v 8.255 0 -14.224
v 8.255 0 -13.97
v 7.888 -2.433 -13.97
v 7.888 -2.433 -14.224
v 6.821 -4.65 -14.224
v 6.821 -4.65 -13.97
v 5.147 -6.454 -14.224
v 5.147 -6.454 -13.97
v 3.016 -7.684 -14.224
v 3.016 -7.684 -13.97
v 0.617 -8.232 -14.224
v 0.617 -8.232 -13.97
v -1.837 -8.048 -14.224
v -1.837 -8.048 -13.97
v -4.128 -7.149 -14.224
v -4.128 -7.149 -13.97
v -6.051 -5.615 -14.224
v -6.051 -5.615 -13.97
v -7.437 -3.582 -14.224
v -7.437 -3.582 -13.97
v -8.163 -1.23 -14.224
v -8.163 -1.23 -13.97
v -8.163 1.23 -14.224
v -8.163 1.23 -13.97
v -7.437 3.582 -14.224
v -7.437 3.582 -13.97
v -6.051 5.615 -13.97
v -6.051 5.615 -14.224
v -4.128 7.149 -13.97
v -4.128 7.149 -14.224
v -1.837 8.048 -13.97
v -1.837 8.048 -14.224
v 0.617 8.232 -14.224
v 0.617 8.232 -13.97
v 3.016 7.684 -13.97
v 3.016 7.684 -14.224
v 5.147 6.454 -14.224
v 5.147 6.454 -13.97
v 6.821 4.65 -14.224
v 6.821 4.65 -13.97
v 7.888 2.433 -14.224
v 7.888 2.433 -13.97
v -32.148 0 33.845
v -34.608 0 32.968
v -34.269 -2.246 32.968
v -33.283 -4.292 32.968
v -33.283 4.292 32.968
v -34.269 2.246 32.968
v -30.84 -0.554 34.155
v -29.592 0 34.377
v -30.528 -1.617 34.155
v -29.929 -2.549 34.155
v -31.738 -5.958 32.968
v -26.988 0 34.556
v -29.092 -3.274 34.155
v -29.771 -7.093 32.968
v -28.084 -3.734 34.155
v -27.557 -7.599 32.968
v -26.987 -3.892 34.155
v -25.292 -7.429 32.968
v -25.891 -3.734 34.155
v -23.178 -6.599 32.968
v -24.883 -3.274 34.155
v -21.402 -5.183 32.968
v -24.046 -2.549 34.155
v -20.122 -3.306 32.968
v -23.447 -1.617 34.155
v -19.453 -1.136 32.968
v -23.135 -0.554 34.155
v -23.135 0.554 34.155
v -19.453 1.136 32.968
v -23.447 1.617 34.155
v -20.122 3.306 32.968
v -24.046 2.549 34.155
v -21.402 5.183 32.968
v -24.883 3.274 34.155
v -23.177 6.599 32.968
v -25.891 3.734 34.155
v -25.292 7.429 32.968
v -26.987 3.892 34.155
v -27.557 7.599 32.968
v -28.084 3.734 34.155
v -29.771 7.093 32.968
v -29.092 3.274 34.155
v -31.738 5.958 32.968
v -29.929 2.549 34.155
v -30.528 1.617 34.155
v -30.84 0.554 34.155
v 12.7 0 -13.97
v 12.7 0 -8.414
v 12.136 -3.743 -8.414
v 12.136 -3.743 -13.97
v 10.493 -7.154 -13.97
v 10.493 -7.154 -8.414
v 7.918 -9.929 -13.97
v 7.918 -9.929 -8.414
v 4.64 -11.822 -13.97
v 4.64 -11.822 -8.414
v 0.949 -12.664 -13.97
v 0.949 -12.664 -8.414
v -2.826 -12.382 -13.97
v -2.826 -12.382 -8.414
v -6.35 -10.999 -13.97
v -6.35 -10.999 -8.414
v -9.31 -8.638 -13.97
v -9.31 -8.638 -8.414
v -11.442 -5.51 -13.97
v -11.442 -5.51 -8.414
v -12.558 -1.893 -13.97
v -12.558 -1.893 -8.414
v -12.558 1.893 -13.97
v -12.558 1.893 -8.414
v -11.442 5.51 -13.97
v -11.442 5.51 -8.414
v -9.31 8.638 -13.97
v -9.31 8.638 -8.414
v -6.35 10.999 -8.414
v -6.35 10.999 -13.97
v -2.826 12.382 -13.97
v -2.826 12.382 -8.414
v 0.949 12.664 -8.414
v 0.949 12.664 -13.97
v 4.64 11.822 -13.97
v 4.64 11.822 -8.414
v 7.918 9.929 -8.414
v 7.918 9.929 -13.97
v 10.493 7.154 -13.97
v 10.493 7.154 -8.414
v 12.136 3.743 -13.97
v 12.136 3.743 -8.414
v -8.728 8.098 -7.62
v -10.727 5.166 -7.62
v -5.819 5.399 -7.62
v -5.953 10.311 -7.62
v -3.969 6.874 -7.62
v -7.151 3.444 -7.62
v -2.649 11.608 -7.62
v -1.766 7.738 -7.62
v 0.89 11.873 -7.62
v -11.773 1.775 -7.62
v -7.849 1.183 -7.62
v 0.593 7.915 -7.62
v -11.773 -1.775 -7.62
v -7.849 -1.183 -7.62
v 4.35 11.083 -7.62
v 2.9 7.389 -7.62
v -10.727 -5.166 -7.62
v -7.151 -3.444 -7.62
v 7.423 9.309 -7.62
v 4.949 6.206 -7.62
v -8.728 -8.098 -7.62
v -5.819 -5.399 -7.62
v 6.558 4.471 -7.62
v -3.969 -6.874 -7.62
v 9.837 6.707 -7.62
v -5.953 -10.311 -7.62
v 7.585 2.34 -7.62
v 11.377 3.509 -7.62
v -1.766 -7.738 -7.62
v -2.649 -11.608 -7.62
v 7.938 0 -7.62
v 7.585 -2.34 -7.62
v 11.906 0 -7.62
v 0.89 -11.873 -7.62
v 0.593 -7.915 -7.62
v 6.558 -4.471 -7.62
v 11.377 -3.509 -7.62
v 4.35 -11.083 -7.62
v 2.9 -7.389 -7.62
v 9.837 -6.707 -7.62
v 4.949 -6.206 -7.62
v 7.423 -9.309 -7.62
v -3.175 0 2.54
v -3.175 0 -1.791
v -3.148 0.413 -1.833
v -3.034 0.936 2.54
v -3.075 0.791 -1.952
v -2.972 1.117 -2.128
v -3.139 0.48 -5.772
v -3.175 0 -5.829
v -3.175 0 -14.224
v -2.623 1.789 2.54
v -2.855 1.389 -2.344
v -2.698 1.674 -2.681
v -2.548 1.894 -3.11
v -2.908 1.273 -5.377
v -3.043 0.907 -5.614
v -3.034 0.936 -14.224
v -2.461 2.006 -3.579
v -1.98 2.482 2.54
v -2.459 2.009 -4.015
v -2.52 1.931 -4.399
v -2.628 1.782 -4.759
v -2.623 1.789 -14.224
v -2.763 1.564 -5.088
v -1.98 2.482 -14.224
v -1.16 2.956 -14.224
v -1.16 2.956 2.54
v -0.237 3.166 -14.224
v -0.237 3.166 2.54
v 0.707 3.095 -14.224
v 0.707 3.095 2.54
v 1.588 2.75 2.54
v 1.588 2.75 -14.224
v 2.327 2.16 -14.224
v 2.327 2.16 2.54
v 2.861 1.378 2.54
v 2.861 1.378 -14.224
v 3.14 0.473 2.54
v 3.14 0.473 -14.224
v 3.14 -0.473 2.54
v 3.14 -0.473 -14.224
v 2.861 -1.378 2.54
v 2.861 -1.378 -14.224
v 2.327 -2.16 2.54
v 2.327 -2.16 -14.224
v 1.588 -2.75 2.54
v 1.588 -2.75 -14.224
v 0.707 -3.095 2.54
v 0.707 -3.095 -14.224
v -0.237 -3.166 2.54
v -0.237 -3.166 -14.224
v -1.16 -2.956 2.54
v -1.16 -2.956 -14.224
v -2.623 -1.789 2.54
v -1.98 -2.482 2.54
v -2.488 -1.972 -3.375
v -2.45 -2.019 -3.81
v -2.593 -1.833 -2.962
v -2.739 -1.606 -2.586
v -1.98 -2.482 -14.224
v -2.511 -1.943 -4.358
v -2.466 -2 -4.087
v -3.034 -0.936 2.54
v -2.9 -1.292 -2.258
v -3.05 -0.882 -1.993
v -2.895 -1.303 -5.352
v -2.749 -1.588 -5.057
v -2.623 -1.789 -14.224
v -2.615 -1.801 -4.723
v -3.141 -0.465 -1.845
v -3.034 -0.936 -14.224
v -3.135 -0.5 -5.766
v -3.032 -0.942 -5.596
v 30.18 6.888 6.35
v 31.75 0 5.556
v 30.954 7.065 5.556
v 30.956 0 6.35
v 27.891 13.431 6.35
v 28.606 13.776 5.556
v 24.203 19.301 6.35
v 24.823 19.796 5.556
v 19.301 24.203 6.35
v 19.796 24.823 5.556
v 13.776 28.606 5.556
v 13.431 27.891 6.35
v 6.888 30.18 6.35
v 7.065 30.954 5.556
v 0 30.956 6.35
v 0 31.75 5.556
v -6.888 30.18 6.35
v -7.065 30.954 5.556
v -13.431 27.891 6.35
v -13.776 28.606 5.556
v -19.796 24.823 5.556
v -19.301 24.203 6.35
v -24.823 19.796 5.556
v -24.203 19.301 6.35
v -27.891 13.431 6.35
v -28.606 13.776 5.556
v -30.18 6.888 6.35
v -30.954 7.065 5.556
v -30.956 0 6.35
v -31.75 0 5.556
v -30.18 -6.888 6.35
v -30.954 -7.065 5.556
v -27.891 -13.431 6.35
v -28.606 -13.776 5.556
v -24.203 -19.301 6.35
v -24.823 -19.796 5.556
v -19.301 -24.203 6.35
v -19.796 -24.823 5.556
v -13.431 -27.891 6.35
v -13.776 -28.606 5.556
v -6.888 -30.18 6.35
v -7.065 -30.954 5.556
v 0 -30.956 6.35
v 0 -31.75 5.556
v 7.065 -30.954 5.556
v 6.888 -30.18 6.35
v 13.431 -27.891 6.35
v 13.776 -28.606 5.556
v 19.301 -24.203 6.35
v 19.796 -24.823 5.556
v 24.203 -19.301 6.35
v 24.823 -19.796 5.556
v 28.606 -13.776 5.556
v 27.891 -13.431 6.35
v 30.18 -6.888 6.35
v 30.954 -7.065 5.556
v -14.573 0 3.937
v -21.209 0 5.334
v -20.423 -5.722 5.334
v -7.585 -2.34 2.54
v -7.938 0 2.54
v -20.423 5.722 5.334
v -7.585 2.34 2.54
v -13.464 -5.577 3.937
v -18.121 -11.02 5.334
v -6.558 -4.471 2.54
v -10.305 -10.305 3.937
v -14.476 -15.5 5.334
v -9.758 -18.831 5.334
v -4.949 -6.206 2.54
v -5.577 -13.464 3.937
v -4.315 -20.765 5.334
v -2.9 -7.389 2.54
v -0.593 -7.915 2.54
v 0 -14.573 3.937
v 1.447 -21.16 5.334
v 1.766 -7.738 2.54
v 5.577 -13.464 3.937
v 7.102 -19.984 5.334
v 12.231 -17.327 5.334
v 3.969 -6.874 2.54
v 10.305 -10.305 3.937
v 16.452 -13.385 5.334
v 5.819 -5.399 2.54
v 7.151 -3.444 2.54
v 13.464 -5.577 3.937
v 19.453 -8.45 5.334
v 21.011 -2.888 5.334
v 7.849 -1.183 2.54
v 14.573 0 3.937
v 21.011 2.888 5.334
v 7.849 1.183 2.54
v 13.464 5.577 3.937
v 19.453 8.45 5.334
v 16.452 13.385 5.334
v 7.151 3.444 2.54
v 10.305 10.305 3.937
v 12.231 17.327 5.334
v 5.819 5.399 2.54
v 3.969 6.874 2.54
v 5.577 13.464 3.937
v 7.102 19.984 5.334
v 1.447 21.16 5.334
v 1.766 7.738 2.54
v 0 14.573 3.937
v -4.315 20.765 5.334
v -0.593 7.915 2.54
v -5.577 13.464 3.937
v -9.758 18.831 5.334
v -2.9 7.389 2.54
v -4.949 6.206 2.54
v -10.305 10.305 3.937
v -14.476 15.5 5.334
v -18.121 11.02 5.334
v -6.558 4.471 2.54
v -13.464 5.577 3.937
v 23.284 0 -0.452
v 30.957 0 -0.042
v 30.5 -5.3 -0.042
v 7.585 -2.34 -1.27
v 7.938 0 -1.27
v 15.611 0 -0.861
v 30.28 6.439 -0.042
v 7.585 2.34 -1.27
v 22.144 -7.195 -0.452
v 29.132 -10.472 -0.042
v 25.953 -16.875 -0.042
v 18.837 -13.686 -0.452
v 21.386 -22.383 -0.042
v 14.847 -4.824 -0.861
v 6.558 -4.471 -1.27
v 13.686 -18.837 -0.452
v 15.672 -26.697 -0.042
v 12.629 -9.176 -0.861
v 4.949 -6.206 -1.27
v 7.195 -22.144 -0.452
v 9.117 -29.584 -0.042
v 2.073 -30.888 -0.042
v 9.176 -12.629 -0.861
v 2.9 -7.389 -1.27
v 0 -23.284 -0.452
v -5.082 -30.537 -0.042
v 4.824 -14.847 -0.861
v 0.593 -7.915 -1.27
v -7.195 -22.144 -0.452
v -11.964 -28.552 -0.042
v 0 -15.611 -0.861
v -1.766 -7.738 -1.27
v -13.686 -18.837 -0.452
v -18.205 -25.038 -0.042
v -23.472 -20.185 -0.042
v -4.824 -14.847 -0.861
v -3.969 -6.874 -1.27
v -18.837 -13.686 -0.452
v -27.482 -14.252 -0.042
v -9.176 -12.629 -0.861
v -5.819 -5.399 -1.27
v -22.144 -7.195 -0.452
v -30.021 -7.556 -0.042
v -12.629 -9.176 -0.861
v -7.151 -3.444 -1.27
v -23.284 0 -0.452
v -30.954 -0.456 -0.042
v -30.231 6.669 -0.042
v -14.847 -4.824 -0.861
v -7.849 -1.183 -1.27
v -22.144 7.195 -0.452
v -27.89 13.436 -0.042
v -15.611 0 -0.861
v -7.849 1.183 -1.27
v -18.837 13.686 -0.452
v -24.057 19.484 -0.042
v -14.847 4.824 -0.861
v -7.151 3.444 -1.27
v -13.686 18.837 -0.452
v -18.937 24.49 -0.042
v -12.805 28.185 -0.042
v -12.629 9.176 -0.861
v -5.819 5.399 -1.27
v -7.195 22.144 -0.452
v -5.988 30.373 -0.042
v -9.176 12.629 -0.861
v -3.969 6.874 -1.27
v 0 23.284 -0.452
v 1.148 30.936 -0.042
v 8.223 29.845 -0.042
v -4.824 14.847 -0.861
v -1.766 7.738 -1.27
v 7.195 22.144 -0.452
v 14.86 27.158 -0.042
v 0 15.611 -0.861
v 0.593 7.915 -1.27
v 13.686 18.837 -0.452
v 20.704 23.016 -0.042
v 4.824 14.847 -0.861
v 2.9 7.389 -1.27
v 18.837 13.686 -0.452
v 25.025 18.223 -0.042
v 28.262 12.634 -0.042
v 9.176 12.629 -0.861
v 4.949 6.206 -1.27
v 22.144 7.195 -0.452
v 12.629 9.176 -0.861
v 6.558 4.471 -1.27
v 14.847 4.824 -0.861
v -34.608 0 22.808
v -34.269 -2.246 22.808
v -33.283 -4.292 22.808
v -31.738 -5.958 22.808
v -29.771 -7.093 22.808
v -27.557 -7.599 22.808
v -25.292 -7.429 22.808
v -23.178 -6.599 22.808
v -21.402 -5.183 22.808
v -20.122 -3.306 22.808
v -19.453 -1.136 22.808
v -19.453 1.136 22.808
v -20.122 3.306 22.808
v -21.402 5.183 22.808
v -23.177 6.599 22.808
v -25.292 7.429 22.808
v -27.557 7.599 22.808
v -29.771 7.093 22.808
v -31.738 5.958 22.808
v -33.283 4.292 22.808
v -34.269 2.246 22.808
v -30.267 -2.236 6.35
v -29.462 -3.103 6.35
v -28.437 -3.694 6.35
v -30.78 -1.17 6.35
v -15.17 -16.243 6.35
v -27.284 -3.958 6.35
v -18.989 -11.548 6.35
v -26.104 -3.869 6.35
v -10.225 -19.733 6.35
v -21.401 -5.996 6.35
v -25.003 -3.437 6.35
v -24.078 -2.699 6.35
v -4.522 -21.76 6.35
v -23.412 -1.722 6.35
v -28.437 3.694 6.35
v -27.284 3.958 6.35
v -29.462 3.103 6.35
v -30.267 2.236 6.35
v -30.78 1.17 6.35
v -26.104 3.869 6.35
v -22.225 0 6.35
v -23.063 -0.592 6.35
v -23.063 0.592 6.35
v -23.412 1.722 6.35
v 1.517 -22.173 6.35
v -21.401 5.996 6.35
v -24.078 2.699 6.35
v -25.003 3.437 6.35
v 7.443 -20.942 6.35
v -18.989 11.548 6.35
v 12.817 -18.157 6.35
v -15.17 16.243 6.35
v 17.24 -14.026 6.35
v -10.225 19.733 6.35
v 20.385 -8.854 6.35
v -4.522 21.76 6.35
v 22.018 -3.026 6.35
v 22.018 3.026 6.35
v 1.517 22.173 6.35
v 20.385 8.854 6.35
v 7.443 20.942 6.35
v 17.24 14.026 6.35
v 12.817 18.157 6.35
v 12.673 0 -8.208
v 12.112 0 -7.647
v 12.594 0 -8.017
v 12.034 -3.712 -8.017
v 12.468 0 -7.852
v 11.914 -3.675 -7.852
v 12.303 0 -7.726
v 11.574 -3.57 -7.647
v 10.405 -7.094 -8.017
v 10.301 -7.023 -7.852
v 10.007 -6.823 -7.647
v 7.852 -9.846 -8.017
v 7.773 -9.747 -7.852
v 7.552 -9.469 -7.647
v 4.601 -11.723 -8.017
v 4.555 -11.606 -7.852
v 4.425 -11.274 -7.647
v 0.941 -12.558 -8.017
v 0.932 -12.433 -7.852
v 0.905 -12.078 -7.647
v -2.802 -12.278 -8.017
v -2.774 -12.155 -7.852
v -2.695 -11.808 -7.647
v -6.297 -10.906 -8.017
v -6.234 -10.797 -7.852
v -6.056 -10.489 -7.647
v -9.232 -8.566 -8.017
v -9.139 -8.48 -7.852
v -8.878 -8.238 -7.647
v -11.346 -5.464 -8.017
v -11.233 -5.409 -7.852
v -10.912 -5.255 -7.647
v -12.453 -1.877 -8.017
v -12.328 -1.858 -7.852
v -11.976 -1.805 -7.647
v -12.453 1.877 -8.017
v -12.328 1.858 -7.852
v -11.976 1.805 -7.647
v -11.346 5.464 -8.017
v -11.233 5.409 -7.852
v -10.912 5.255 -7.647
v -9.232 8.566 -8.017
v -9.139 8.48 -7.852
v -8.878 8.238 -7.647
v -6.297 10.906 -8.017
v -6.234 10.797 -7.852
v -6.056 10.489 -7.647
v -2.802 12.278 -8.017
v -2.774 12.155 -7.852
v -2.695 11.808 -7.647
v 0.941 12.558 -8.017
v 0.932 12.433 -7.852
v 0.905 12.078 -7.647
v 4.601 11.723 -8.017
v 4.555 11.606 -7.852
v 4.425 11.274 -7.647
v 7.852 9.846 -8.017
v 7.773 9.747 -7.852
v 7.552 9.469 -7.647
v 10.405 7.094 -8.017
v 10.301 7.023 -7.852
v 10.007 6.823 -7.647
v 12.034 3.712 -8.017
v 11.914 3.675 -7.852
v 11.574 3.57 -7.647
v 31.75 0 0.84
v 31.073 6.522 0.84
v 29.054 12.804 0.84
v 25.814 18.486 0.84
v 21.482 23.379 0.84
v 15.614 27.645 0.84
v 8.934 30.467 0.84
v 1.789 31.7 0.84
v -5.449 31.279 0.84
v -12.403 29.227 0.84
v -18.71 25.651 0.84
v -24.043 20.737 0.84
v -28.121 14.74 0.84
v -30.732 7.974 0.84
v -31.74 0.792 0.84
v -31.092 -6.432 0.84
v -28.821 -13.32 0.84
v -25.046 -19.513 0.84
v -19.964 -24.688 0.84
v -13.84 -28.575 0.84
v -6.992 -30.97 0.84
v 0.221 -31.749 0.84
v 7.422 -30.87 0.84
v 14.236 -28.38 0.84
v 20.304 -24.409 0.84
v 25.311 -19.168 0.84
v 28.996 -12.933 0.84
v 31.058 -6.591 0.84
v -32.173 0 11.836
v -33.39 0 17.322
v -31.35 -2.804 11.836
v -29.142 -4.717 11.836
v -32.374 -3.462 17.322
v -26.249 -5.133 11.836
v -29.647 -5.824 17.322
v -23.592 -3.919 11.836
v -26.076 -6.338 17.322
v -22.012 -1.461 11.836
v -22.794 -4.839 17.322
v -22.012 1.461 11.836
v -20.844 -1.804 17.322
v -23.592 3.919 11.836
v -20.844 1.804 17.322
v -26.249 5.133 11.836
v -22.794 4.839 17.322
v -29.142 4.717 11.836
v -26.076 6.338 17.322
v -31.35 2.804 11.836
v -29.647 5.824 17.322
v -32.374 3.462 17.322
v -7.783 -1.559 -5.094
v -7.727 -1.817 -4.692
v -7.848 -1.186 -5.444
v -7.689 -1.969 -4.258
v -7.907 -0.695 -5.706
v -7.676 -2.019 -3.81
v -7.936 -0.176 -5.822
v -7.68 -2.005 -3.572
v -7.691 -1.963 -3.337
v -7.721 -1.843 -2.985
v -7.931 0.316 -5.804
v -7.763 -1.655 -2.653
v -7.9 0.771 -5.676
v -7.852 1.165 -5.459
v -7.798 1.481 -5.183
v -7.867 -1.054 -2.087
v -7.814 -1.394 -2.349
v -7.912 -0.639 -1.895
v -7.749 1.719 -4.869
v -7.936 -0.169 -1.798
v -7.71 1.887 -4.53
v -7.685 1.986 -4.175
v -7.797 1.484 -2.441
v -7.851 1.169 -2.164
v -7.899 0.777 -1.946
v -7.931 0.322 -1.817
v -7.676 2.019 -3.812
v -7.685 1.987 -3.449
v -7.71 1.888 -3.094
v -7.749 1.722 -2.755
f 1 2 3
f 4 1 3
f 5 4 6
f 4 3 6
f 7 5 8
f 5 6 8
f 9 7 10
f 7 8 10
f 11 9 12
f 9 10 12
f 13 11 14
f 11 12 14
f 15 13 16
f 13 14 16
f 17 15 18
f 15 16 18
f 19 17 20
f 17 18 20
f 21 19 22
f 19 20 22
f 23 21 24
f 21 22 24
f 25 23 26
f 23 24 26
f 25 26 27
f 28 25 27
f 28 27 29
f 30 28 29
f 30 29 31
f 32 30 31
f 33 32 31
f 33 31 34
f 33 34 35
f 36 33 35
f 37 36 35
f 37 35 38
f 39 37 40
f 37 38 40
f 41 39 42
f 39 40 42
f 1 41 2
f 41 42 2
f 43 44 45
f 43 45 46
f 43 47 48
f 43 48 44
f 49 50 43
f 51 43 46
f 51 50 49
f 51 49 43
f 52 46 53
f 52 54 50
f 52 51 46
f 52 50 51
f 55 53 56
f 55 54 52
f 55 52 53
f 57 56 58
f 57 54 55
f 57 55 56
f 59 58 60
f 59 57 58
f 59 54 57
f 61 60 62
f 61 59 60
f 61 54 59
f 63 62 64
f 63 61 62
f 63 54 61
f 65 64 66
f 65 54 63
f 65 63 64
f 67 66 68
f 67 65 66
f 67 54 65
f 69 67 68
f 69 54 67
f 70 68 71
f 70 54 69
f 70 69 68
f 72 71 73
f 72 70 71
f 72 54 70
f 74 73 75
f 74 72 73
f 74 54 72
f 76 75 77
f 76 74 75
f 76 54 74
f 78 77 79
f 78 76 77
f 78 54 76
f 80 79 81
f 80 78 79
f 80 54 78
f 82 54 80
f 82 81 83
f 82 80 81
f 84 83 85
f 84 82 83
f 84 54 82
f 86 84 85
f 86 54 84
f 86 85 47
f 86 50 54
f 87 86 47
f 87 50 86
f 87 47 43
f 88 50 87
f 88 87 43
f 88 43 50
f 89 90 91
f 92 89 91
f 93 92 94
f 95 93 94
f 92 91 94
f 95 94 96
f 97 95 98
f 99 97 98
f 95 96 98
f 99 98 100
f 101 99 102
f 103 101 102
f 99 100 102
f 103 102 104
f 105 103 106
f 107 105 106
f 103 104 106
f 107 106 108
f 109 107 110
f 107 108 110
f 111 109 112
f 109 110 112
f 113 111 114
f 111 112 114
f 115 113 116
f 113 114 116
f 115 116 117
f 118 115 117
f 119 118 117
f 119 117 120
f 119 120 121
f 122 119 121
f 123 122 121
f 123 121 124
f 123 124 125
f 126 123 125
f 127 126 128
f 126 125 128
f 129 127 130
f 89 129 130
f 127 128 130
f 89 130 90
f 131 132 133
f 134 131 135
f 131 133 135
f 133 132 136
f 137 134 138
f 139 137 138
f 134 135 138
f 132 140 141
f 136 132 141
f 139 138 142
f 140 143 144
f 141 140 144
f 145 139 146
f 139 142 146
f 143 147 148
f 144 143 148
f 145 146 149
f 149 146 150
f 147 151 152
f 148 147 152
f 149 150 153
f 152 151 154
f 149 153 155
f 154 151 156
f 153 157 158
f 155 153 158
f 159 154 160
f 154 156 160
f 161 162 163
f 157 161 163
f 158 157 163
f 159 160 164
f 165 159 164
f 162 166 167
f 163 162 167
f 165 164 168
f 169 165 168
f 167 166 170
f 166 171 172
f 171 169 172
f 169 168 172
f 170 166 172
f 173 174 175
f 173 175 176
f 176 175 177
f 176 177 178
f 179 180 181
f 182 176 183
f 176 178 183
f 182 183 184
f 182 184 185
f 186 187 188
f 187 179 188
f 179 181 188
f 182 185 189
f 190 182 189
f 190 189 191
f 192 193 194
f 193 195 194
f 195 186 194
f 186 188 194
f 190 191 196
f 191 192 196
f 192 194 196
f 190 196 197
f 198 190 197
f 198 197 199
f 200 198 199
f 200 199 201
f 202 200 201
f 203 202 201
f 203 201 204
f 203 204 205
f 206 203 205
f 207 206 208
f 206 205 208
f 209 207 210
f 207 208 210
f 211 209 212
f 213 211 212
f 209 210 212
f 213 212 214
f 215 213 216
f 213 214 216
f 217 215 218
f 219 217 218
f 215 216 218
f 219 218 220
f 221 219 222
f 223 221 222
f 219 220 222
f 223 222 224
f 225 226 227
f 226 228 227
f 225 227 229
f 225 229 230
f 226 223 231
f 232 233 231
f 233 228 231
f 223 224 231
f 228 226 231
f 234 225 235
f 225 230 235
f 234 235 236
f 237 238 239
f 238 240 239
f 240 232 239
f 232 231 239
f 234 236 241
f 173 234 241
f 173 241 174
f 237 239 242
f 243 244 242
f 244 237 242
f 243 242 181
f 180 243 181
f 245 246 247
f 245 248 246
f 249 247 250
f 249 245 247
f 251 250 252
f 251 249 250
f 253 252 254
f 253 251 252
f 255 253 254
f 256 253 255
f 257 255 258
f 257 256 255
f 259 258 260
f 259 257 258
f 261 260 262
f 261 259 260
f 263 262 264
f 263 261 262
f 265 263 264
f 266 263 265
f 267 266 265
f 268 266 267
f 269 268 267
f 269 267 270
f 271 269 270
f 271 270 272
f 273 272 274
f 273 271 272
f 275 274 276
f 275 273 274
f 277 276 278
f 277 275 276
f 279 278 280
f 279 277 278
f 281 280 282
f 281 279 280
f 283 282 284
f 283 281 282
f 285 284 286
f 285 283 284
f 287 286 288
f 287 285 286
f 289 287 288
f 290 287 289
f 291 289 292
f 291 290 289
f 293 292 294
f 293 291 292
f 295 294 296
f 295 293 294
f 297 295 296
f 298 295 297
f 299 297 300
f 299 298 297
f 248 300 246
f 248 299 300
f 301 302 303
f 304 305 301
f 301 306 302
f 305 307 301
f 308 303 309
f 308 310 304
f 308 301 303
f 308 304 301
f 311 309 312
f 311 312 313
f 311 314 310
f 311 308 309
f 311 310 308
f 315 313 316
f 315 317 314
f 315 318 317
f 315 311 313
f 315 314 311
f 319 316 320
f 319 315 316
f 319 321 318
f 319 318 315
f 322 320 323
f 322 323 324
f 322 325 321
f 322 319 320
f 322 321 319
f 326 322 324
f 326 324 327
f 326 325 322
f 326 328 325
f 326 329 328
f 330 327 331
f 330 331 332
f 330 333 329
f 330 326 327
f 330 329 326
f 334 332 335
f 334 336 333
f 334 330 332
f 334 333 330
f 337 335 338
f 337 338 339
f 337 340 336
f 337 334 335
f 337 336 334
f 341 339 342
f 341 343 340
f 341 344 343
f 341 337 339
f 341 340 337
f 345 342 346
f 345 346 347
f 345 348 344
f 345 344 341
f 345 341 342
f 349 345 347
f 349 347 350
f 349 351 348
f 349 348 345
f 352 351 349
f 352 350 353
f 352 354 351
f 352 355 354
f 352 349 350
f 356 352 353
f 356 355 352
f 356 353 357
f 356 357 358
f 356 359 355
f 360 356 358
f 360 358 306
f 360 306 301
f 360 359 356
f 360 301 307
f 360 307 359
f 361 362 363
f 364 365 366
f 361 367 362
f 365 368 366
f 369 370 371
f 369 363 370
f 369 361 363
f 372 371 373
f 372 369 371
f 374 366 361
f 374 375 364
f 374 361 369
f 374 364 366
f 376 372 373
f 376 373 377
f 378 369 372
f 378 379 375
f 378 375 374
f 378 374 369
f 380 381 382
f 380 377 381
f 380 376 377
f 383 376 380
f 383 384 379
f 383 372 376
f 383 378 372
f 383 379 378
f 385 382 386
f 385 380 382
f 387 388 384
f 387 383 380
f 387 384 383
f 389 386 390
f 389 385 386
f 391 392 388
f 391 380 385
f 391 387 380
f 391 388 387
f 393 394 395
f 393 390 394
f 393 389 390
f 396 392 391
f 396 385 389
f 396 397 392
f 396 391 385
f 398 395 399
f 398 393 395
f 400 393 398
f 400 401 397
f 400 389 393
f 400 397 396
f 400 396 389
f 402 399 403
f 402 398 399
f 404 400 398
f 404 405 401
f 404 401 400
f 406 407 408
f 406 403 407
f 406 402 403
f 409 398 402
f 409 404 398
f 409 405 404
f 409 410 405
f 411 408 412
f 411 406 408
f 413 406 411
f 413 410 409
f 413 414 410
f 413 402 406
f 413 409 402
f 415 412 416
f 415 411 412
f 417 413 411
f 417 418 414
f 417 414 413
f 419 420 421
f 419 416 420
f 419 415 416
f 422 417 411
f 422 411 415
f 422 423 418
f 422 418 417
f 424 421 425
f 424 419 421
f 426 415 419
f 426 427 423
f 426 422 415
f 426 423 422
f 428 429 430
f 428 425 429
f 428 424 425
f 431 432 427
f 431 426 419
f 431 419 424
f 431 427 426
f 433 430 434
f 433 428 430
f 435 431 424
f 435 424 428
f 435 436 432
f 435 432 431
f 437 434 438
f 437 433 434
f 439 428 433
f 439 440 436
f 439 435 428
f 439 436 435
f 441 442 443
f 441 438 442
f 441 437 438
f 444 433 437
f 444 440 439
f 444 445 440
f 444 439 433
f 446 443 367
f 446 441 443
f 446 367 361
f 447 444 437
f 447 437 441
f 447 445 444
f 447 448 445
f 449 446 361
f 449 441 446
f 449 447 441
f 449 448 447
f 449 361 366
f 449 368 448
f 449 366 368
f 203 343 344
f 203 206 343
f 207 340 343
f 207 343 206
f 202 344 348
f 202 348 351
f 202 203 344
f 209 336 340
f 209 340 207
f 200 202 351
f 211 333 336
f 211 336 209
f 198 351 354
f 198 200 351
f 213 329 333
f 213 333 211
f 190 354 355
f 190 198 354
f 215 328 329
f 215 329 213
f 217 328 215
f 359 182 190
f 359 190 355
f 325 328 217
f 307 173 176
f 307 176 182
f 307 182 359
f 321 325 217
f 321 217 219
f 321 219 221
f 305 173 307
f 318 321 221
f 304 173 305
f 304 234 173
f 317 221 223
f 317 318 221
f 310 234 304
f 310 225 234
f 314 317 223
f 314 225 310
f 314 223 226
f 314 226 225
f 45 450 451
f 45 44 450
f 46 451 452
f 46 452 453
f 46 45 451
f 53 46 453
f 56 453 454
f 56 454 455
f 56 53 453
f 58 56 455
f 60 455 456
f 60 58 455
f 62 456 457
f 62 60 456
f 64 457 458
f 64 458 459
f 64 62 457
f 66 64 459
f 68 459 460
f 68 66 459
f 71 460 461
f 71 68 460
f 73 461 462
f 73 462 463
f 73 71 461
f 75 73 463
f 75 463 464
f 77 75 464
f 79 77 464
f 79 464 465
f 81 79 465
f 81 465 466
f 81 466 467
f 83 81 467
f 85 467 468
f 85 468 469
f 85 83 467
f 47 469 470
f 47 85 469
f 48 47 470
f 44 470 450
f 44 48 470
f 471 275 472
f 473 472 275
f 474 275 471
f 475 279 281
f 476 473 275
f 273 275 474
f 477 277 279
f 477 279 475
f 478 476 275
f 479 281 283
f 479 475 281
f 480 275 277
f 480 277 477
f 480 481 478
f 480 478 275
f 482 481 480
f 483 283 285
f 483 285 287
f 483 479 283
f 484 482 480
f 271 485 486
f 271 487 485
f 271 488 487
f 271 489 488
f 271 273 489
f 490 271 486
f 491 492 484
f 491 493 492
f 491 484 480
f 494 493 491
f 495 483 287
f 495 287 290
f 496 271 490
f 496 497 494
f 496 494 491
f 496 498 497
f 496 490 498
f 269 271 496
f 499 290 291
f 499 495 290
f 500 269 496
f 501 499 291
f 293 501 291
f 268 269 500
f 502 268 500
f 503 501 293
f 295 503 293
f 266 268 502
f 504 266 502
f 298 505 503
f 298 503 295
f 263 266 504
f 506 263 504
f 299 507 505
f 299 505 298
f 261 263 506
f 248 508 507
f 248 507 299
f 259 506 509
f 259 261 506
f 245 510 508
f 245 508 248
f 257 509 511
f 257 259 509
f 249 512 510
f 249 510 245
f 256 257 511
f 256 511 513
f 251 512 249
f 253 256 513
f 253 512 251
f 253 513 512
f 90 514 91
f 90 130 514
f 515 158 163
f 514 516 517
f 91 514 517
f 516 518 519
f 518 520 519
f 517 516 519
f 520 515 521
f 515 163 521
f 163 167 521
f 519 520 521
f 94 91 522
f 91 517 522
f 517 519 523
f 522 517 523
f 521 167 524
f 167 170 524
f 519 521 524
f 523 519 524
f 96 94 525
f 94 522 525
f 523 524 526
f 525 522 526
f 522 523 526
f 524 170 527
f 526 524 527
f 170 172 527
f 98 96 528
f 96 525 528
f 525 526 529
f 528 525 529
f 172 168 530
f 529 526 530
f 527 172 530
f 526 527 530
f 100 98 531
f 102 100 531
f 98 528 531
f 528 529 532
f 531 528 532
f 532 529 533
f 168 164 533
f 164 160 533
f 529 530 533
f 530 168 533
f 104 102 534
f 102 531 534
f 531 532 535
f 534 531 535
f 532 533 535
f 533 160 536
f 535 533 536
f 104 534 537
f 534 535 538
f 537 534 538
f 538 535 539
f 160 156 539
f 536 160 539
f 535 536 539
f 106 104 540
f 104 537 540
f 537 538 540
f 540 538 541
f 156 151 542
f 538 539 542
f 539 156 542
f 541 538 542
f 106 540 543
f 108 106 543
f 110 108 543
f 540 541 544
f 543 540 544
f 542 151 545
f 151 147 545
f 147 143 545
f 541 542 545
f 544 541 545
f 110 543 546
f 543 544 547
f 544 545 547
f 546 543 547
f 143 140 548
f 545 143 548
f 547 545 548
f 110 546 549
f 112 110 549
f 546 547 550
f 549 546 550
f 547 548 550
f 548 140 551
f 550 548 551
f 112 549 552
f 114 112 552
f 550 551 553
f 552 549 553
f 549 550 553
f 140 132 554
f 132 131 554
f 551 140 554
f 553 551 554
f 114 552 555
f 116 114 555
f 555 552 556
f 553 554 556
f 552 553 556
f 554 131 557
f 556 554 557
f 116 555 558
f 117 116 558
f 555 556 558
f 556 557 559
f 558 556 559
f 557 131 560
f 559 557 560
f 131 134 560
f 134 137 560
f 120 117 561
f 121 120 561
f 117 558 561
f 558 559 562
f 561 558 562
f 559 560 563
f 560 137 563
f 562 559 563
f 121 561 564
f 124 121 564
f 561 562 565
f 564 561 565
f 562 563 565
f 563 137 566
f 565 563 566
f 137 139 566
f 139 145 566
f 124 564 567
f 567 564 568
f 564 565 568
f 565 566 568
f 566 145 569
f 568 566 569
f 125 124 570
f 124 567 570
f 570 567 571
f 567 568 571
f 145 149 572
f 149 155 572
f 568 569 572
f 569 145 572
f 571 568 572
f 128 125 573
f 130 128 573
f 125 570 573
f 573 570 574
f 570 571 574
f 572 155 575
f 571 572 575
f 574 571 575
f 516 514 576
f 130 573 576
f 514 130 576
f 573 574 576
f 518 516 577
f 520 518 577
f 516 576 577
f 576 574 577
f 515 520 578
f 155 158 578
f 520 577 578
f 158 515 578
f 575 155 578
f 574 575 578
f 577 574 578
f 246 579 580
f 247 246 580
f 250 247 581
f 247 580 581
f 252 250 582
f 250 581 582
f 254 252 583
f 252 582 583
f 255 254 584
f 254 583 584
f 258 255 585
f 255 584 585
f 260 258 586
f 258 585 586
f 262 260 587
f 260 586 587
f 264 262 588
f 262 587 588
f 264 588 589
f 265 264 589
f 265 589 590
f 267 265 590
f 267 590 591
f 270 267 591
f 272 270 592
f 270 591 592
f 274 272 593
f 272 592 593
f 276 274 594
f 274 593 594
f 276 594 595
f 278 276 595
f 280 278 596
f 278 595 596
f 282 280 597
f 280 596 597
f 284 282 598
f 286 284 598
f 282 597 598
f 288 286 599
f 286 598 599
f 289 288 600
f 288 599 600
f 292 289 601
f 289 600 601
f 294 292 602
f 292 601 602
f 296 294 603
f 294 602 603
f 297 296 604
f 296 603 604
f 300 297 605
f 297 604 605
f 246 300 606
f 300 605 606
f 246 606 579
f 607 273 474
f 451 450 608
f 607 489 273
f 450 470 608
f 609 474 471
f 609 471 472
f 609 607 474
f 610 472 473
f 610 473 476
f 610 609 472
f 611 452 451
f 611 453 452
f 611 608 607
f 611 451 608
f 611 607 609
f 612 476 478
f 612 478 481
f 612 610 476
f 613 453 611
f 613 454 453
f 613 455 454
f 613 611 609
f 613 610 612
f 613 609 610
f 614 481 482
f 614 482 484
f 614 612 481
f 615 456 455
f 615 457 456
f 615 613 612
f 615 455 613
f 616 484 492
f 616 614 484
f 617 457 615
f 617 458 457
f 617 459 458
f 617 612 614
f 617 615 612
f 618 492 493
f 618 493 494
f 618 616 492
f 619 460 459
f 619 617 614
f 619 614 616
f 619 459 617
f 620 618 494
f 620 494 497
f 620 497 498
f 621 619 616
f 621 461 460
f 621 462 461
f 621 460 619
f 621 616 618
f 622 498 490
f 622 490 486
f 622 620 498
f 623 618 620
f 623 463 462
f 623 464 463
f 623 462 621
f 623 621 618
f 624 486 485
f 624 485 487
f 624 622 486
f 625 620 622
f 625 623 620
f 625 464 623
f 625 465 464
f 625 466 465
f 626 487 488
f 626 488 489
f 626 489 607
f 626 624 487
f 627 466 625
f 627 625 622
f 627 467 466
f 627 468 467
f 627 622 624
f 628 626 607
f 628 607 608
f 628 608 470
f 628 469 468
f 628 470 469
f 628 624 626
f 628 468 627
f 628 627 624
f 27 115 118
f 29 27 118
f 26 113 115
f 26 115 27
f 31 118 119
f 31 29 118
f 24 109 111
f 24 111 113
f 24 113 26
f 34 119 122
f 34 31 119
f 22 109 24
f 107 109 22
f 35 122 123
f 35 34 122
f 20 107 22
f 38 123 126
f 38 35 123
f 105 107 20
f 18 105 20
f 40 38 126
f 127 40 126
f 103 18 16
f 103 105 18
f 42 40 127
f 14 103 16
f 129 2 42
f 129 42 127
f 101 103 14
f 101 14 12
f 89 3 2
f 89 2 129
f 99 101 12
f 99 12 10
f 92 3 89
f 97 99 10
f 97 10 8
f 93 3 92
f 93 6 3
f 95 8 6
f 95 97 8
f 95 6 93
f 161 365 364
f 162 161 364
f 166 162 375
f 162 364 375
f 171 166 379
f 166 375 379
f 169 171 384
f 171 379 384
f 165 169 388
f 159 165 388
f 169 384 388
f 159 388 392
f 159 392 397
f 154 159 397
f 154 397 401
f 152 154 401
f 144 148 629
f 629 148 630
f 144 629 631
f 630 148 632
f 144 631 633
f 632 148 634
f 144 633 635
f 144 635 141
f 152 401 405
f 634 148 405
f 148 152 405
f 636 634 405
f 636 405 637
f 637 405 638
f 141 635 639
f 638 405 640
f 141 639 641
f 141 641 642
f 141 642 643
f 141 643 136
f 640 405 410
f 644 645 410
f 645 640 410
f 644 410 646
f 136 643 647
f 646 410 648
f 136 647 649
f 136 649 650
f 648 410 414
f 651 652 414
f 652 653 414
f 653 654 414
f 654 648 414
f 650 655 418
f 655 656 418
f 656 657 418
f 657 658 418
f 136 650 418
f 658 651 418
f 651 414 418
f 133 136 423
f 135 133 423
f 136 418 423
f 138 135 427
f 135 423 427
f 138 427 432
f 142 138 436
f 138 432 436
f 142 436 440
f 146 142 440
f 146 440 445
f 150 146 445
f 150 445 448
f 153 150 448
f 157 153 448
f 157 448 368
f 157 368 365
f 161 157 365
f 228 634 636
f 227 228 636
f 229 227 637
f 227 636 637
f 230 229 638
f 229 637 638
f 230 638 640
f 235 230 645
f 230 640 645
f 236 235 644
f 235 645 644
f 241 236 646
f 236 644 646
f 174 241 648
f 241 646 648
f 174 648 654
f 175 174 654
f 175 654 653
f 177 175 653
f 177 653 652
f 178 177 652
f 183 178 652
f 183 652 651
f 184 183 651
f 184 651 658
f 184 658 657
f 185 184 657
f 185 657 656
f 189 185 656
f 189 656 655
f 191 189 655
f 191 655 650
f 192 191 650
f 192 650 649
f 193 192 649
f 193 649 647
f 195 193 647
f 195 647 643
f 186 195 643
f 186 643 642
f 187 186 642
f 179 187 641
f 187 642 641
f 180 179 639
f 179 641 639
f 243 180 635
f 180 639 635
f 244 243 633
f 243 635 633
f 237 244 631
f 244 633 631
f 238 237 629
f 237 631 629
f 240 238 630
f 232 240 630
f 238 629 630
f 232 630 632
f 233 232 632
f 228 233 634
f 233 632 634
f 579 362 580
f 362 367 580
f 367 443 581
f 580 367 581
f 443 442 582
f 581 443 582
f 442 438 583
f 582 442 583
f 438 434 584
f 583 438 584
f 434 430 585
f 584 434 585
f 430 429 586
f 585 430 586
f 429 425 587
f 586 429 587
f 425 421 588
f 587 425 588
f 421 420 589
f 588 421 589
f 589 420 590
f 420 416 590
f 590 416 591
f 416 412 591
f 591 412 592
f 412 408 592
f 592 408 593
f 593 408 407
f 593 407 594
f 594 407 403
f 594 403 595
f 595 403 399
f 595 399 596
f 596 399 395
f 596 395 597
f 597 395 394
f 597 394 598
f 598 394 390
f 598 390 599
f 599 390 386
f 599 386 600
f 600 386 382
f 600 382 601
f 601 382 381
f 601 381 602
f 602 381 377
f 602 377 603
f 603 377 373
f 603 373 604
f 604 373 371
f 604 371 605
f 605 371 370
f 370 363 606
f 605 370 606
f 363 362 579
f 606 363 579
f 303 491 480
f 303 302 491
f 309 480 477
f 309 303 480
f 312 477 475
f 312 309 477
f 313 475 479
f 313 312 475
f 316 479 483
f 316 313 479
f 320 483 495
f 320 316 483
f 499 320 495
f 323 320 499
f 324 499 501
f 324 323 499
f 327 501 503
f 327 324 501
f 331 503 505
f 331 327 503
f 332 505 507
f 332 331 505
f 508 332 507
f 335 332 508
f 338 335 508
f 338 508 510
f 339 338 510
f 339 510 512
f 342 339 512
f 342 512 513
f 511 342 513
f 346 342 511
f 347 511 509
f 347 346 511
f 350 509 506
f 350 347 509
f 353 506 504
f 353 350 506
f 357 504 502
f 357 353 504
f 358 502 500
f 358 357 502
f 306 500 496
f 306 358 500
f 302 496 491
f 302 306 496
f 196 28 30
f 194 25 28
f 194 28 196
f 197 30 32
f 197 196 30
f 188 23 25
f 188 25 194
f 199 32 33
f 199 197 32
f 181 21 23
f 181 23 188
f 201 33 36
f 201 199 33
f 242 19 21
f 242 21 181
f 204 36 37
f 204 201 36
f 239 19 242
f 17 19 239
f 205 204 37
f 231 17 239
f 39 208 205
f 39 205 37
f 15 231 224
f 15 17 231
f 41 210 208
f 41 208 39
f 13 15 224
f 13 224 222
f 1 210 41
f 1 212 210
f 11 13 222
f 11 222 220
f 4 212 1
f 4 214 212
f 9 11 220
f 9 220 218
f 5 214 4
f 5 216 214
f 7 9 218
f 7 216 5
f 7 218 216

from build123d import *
from OCP.BRepFilletAPI import BRepFilletAPI_MakeChamfer

# Parameters (mm, degrees)
SKETCH1_R                   = 31.75
EXTRUDE1_DEPTH              = 6.35
SKETCH4_R                   = 7.9375
EXTRUDE2_DEPTH              = 6.35
SKETCH5_R                   = 12.7
EXTRUDE3_DEPTH              = 6.35
SKETCH6_R                   = 8.255
EXTRUDE4_DEPTH              = 0.254
SKETCH7_R                   = 3.175
EXTRUDE5_DEPTH              = 50.390428992
FILLET1_R                   = 0.79375
CHAMFER1_SIZE               = 0.79375
CHAMFER1_SIZE2              = 0.839659951
F_10_32_TAPPED_HOLE1_REACH  = 53.959
F_10_32_TAPPED_HOLE1_BORE_R = 2.0193
SKETCH12_R                  = 3.175
EXTRUDE6_DEPTH              = 27.94


with BuildPart() as part:
    # Sketch1 → Extrude1 (new body)
    with BuildSketch(Plane.XY):
        Circle(SKETCH1_R)
    extrude(amount=EXTRUDE1_DEPTH)

    # Sketch2 → Cut-Revolve4 (revolve, cut)
    with BuildSketch(Plane(origin=(0, 0, 0), x_dir=(1, 0, 0), z_dir=(0, 1, 0)), mode=Mode.PRIVATE) as cut_revolve4_sk:
        Polygon((22.225, -6.35), (21.209, -5.334), (7.9375, -2.54), (0, -2.54), (0, -6.35), align=None)
    revolve(cut_revolve4_sk.sketch.rotate(Axis((0, 0, 0), (0, 0, 1)), 180), axis=Axis((0, 0, 0), (0, 0, 1)), mode=Mode.SUBTRACT)

    # Sketch3 → Revolve1 (revolve)
    with BuildSketch(Plane(origin=(0, 0, 0), x_dir=(1, 0, 0), z_dir=(0, 1, 0)), mode=Mode.PRIVATE) as revolve1_sk:
        Polygon((-31.75, 0), (-7.9375, 1.27), (0, 1.27), (0, 0), align=None)
    revolve(revolve1_sk.sketch.rotate(Axis((0, 0, 0), (0, 0, -1)), 180), axis=Axis((0, 0, 0), (0, 0, -1)))

    # Sketch4 → Extrude2 (add)
    with BuildSketch(Plane(origin=(0, 0, -1.27), x_dir=(-1, 0, 0), z_dir=(0, 0, -1))):
        with Locations(Location((0, 0, 0), (0, 0, 180))):
            Circle(SKETCH4_R)
    extrude(amount=EXTRUDE2_DEPTH)

    # Sketch5 → Extrude3 (add)
    with BuildSketch(Plane(origin=(0, 0, -7.62), x_dir=(-1, 0, 0), z_dir=(0, 0, -1))):
        with Locations(Location((0, 0, 0), (0, 0, 180))):
            Circle(SKETCH5_R)
    extrude(amount=EXTRUDE3_DEPTH)

    # Sketch6 → Extrude4 (add)
    with BuildSketch(Plane(origin=(0, 0, -13.97), x_dir=(-1, 0, 0), z_dir=(0, 0, -1))):
        with Locations(Location((0, 0, 0), (0, 0, 180))):
            Circle(SKETCH6_R)
    extrude(amount=EXTRUDE4_DEPTH)

    # Sketch7 → Extrude5 (cut, through all)
    with BuildSketch(Plane(origin=(0, 0, -14.224), x_dir=(-1, 0, 0), z_dir=(0, 0, -1))):
        Circle(SKETCH7_R)
    extrude(amount=-EXTRUDE5_DEPTH, mode=Mode.SUBTRACT)

    # Fillet1
    fillet1_edges = [part.edges().sort_by_distance(p)[0] for p in [
        (-12.7, 0, -7.62),
    ]]
    fillet(fillet1_edges, radius=FILLET1_R)

    # Chamfer1: one chamfer whose edges measure the first distance from different faces: ONE call of the kernel's chamfer builder (chamfer() names one face for all edges)
    chamfer1_edges_1 = [part.edges().sort_by_distance(p)[0] for p in [
        (-31.75, 0, 6.35),
    ]]
    chamfer1_edges_2 = [part.edges().sort_by_distance(p)[0] for p in [
        (-31.75, 0, 0),
    ]]
    chamfer1_side_2 = [part.faces().sort_by_distance(p)[0] for p in [
        (-19.84375, 0, -0.635),
    ]]
    chamfer1 = BRepFilletAPI_MakeChamfer(part.part.solid().wrapped)
    for e in chamfer1_edges_1:
        chamfer1.Add(CHAMFER1_SIZE, e.wrapped)
    for e in chamfer1_edges_2:
        chamfer1.Add(CHAMFER1_SIZE, CHAMFER1_SIZE2, e.wrapped, chamfer1_side_2[0].wrapped)  # the first distance lies on this face
    add(Compound.cast(chamfer1.Shape()), mode=Mode.REPLACE)

    # #10-32 Tapped Hole1 bore → #10-32 Tapped Hole1 (cut, up to next)
    with BuildSketch(Plane(origin=(-7.9375, 0, -4.445), x_dir=(0, -1, 0), z_dir=(-1, 0, 0)), mode=Mode.PRIVATE) as f_10_32_tapped_hole1_sk1:
        with Locations((0, 0.635)):
            Circle(F_10_32_TAPPED_HOLE1_BORE_R)
    f_10_32_tapped_hole1_tool1 = extrude(f_10_32_tapped_hole1_sk1.sketch, amount=-F_10_32_TAPPED_HOLE1_REACH, mode=Mode.PRIVATE) & part.part
    add(f_10_32_tapped_hole1_tool1.solids().sort_by_distance((-7.9375, 0, -3.81))[0], mode=Mode.SUBTRACT)

    # Sketch12 → Extrude6 (add)
    with BuildSketch(Plane.XY.offset(6.35)):
        with Locations((-26.9875, 0)):
            Circle(SKETCH12_R)
    extrude(amount=EXTRUDE6_DEPTH)

    # Sketch13 → Revolve2 (revolve)
    with BuildSketch(Plane(origin=(0, 0, 0), x_dir=(1, 0, 0), z_dir=(0, 1, 0)), mode=Mode.PRIVATE) as revolve2_sk:
        with BuildLine():
            Line((-26.9875, -6.35), (-23.01875, -6.35))
            Line((-23.01875, -6.35), (-19.3675, -22.808497077))
            Line((-19.3675, -22.808497077), (-19.3675, -32.968497077))
            ThreePointArc((-19.3675, -32.968497077), (-23.095695912, -34.154906701), (-26.9875, -34.555997077))
            Line((-26.9875, -34.555997077), (-26.9875, -6.35))
        make_face()
    revolve(revolve2_sk.sketch.rotate(Axis((-26.9875, 0, -6.630939357), (0, 0, 1)), 180), axis=Axis((-26.9875, 0, -6.630939357), (0, 0, 1)))


solid = part.part
